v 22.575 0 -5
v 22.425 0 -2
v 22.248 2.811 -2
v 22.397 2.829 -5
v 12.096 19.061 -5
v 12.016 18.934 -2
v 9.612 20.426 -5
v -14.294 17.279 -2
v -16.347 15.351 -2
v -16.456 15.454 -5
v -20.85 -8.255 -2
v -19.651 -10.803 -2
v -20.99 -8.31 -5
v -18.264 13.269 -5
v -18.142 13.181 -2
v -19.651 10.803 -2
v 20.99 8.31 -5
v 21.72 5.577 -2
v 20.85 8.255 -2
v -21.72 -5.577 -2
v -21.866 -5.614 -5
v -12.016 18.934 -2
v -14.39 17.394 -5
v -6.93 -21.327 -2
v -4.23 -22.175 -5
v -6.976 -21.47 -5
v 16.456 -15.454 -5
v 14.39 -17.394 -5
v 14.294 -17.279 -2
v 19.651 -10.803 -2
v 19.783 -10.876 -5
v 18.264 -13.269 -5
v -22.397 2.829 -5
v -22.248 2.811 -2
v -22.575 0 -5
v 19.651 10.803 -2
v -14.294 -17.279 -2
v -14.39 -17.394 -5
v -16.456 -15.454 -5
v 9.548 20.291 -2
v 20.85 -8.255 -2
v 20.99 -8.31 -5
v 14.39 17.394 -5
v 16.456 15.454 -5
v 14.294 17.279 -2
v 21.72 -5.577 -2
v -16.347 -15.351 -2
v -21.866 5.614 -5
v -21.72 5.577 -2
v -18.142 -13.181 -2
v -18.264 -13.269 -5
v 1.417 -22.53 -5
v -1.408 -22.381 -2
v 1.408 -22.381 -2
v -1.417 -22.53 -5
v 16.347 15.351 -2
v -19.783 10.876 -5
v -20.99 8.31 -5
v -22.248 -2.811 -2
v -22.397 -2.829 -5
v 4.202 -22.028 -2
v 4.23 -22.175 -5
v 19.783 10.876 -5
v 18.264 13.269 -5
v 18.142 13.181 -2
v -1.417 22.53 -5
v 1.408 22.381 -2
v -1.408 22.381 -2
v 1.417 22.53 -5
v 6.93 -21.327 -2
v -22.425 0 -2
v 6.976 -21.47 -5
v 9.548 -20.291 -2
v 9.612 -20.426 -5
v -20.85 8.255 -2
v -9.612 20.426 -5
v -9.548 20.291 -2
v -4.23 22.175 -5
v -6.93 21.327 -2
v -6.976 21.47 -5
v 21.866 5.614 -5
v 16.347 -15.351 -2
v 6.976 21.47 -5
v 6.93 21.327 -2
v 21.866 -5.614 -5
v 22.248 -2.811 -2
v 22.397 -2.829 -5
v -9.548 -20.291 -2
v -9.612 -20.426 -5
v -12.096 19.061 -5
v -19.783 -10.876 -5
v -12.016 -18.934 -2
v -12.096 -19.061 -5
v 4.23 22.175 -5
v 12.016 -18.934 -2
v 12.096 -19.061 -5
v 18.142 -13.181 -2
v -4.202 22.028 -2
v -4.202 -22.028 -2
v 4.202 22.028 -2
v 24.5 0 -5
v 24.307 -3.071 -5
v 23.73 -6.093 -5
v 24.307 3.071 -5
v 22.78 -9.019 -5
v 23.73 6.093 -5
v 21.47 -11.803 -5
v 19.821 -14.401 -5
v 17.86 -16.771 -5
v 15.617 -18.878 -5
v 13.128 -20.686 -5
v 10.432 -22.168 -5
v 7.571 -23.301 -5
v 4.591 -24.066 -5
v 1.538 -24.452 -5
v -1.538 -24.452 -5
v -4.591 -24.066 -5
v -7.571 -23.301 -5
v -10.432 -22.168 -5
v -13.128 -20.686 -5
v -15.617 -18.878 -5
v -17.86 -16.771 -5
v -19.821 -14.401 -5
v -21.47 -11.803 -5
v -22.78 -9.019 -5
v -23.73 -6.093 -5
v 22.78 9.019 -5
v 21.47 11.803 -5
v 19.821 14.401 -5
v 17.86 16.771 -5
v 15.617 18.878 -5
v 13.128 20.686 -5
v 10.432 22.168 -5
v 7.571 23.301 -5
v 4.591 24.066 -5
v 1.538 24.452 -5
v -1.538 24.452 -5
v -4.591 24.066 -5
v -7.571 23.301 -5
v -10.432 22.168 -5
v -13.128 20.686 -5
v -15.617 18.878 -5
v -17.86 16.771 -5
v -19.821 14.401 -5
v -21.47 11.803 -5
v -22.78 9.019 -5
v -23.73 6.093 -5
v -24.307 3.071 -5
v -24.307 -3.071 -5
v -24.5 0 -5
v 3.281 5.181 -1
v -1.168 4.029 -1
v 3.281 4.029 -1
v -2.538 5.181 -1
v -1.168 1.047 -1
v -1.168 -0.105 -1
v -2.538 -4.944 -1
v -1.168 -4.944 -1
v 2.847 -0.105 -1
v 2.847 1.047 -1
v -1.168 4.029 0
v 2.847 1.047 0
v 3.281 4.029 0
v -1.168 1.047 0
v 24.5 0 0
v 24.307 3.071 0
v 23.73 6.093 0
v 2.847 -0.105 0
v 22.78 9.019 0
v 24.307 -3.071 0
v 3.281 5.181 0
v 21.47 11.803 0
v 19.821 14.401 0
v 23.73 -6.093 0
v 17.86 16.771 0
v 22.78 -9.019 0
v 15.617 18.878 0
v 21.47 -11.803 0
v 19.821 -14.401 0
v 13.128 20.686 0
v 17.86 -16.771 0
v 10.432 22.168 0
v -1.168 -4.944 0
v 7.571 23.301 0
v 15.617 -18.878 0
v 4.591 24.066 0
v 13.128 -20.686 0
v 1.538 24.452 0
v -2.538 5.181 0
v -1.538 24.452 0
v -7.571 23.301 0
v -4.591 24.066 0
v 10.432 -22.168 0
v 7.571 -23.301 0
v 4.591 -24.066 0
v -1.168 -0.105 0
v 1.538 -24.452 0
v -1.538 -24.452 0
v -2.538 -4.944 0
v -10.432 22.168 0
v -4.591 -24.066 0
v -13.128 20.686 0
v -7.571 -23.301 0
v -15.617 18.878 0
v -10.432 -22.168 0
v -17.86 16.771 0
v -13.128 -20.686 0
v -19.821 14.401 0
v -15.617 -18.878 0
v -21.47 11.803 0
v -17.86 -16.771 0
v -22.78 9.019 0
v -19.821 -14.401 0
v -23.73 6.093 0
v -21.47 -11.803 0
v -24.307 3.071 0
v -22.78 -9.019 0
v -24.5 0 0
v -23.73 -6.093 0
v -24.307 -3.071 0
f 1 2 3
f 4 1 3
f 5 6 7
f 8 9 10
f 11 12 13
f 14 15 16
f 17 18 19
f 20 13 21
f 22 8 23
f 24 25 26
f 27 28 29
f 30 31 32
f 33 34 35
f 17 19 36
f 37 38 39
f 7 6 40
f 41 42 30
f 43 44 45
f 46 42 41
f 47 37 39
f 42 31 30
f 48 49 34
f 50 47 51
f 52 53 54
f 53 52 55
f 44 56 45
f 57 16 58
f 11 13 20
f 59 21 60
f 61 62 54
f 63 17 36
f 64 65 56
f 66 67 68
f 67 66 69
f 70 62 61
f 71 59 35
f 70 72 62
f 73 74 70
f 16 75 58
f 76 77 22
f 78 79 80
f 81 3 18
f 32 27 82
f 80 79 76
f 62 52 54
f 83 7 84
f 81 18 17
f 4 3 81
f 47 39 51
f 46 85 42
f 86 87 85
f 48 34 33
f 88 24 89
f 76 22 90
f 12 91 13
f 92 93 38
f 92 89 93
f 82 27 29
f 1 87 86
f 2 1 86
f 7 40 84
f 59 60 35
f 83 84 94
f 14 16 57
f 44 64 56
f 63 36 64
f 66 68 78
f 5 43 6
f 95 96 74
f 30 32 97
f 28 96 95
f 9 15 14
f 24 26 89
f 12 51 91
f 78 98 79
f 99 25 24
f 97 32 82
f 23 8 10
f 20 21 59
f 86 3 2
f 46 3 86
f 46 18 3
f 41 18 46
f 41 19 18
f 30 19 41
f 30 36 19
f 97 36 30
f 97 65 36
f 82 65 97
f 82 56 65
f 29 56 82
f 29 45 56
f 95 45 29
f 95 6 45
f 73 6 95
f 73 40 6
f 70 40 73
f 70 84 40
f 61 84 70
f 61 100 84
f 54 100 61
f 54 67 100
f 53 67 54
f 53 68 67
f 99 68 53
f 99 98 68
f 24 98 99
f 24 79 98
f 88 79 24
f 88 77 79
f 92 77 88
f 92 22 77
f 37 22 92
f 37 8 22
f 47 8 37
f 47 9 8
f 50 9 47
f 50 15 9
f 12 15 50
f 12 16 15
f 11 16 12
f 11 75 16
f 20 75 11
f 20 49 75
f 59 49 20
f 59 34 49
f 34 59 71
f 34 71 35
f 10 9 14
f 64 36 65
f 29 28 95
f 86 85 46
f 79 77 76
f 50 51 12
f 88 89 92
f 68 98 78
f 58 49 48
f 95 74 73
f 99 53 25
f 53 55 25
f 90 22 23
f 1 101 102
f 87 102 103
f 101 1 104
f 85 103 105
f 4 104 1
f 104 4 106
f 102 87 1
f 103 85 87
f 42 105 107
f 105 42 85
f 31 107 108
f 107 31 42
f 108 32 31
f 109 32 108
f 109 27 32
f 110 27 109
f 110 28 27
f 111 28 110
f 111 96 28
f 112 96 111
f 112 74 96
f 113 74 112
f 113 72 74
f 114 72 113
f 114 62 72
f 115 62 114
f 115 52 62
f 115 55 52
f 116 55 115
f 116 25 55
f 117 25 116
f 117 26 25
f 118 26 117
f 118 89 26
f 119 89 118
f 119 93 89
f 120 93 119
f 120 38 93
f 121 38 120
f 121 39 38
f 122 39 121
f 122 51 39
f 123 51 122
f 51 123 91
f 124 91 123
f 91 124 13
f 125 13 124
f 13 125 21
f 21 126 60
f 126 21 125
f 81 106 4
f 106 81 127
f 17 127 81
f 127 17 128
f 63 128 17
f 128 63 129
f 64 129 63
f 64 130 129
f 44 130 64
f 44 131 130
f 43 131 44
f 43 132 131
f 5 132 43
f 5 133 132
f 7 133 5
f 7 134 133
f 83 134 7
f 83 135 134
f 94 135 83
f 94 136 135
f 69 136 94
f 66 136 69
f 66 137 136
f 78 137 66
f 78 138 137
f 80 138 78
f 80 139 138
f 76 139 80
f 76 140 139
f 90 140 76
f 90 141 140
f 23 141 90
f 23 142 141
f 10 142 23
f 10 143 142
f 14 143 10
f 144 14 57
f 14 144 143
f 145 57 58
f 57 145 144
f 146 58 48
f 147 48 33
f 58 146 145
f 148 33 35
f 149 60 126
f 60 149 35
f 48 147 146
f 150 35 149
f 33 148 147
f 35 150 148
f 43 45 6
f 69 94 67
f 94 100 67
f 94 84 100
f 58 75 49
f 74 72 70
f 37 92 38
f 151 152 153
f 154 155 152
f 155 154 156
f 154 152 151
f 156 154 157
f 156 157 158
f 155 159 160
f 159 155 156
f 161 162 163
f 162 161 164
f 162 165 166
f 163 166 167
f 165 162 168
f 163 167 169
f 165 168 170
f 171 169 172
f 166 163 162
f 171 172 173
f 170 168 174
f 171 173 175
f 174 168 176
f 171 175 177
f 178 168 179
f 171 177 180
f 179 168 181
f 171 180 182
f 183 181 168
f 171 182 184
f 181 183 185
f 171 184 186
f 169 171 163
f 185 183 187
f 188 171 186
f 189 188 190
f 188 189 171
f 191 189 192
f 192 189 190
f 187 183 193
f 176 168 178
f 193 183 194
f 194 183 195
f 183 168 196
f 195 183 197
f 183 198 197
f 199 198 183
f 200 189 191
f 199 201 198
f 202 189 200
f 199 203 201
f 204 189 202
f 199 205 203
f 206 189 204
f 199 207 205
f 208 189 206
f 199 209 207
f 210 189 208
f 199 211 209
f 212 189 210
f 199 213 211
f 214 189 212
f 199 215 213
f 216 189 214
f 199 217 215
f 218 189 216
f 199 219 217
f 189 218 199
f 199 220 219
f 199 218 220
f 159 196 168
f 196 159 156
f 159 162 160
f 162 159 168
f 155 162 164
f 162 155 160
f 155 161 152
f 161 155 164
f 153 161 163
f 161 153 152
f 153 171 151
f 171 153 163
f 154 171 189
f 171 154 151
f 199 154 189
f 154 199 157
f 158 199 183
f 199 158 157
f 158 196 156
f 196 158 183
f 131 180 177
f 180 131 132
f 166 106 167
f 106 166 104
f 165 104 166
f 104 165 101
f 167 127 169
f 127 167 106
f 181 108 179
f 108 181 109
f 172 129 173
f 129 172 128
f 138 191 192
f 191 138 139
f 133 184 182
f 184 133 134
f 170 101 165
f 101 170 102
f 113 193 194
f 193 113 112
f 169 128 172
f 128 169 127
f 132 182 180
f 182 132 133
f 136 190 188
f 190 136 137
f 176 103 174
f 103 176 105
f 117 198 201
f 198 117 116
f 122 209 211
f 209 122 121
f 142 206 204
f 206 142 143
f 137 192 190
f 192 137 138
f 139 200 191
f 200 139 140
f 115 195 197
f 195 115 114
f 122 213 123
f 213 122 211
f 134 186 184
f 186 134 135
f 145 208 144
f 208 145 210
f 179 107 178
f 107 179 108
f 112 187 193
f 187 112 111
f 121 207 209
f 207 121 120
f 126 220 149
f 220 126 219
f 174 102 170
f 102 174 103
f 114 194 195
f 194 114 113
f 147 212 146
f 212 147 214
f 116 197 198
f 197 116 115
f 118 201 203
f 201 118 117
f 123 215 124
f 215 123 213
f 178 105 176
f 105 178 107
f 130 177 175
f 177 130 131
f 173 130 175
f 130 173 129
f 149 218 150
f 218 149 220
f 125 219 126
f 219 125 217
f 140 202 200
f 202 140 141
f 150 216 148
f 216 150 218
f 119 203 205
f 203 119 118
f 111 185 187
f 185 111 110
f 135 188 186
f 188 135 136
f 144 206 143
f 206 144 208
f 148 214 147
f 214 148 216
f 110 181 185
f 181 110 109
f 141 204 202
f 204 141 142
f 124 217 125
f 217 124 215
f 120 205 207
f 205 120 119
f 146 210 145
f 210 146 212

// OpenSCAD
$fn = 50;

difference() {
	union() {
		translate(v = [0, 0, -5.0]) {
			cylinder(h = 5, r = 24.5);
		}
	}
	union() {
		#translate(v = [0, 0, -5.0]) {
			cylinder(h = 3, r1 = 22.575, r2 = 22.425);
		}
		translate(v = [0, 0, -1]) {
			linear_extrude(height = 1) {
				text(font = "Impact", halign = "center", size = 10, text = "F", valign = "center");
			}
		}
	}
}
